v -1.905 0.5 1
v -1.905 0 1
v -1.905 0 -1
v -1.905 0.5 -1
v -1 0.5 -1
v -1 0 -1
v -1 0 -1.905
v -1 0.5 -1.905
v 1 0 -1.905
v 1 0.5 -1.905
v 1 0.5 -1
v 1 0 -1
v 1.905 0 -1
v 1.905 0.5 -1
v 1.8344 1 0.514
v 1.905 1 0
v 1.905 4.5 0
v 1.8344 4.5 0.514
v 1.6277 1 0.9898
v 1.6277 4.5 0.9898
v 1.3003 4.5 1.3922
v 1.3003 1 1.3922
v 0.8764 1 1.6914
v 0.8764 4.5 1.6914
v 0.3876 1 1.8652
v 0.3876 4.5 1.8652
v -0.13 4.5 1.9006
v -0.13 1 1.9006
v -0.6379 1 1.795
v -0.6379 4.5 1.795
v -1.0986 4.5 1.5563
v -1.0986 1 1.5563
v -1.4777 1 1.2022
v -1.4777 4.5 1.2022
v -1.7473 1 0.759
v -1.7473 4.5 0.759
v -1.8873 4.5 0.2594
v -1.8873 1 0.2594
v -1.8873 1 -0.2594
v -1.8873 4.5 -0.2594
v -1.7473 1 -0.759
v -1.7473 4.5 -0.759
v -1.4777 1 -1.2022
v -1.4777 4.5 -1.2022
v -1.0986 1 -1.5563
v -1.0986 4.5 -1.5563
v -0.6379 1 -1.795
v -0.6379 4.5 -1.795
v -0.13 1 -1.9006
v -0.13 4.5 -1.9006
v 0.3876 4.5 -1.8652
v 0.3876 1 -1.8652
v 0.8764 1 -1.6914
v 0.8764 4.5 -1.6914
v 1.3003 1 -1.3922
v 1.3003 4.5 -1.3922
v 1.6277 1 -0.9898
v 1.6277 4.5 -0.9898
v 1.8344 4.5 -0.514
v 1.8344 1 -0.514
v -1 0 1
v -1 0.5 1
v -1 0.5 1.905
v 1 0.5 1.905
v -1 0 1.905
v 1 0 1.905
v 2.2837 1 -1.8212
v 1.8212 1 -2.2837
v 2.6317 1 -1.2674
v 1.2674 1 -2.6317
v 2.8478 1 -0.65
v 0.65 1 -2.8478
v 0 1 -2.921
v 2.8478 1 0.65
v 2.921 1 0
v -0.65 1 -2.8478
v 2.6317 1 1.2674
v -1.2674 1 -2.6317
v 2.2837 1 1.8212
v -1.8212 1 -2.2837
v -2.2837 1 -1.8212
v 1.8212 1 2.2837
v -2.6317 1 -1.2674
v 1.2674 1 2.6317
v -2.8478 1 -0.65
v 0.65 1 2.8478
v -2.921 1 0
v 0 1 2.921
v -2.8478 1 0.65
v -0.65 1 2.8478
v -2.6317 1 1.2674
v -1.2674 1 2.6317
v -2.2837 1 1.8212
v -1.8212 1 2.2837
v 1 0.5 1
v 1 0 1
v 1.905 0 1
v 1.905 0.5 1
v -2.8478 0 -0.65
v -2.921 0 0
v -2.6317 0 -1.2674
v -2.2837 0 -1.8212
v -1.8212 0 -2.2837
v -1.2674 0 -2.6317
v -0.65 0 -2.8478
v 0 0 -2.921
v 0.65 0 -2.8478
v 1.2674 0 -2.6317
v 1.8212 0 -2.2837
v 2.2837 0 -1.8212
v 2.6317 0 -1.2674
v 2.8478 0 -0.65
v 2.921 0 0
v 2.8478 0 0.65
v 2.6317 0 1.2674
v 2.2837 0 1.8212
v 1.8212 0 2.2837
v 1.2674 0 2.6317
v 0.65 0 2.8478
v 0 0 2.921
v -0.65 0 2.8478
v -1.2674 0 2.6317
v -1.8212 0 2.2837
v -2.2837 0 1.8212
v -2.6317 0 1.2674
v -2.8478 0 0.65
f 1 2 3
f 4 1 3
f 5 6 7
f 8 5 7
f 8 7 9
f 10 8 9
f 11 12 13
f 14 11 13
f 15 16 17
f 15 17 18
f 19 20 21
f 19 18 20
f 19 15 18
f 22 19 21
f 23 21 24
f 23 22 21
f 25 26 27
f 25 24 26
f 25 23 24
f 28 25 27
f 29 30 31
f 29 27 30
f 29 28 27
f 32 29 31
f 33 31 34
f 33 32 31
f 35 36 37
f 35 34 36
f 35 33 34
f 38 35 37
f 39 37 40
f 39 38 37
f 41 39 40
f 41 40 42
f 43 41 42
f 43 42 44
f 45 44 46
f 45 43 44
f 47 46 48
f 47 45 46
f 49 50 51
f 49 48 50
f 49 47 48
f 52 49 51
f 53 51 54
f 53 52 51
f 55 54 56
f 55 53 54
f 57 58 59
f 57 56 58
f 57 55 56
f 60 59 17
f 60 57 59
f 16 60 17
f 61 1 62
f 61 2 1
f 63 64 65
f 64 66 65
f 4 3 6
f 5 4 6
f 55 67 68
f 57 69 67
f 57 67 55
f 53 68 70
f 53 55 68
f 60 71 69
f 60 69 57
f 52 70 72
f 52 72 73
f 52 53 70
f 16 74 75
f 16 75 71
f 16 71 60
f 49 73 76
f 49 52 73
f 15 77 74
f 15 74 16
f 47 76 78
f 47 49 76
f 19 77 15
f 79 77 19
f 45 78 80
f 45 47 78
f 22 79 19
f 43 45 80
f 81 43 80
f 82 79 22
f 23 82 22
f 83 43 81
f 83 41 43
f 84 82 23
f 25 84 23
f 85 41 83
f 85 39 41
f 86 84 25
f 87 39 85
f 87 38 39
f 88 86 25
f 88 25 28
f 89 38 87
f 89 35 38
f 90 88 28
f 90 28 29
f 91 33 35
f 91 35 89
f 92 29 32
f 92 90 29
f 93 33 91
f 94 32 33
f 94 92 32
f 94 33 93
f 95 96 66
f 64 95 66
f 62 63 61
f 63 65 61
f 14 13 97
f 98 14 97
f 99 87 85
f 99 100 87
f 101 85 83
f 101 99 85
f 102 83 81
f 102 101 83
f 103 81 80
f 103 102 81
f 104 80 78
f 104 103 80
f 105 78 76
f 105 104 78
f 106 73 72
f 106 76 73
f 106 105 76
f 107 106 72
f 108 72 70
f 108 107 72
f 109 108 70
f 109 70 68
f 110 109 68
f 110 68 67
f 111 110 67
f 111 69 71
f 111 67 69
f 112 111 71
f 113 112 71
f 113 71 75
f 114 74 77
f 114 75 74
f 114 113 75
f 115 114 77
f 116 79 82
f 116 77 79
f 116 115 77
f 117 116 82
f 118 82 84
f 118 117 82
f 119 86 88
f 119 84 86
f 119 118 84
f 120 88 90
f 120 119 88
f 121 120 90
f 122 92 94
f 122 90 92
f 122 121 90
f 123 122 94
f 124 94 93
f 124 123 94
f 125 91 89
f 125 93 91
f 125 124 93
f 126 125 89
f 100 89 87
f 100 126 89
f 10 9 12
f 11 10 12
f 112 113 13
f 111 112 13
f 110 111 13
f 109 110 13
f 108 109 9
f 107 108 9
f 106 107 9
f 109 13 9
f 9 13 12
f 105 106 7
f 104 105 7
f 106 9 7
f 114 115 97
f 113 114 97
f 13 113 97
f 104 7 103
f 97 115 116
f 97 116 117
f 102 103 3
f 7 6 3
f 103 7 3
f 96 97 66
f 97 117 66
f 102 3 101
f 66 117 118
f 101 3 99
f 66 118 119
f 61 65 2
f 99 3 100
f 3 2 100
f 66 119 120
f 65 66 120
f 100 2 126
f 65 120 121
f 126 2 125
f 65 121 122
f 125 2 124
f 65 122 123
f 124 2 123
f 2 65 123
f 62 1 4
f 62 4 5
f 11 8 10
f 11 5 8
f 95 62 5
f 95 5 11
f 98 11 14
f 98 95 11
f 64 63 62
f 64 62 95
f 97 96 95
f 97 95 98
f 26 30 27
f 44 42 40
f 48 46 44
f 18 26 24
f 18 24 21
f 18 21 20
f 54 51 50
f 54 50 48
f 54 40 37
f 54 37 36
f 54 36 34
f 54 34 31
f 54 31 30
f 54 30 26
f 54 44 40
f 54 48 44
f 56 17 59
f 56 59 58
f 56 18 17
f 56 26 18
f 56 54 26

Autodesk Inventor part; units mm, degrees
ref_plane "YZ Plane" through (0, 0, 0) normal (1, 0, 0) x (0, 1, 0)
ref_plane "XZ Plane" through (0, 0, 0) normal (0, 1, 0) x (-1, 0, 0)
ref_plane "XY Plane" through (0, 0, 0) normal (0, 0, 1) x (1, 0, 0)
sketch "Sketch1" plane through (0, 0, 0) normal (0, 1, 0) x (-1, 0, 0)
  circle A0 centre (0, 0) radius 2.921
  dimension "d0" = 5.842
extrude "Extrusion1" add sketch "Sketch1" along normal blind 1
sketch "Sketch2" plane through (0, 1, 0) normal (0, 1, 0) x (1, 0, 0)
  circle A0 centre (0, 0) radius 1.905
  dimension "d3" = 3.81
extrude "Extrusion2" add sketch "Sketch2" along normal blind 3.5
sketch "Sketch3" plane through (0, 0, 0) normal (0, -1, 0) x (1, 0, 0)
  line L0 (0, 1.905) -> (-1, 1.905)
  line L1 (-1, -1.905) -> (1, -1.905)
  line L2 (1, 1.905) -> (0, 1.905)
  line L3 (-1.905, 0) -> (-1.905, -1)
  line L4 (1.905, -1) -> (1.905, 1)
  line L5 (-1.905, 0) -> (-1.905, 1)
  line L6 (-1.905, 1) -> (-1, 1)
  line L7 (1, 1) -> (1.905, 1)
  line L8 (1, -1.905) -> (1, -1)
  line L9 (1, 1) -> (1, 1.905)
  line L10 (-1.905, -1) -> (-1, -1)
  line L11 (1, -1) -> (1.905, -1)
  line L12 (-1, 1.905) -> (-1, 1)
  line L13 (-1, -1) -> (-1, -1.905)
  point P0 (0, 0)
  dimension "d7" = 1
  dimension "d8" = 3.81
  dimension "d9" = 2
  dimension "d10" = 3.81
  dimension "d11" = 1
  dimension "d12" = 3.81
  dimension "d13" = 2
  dimension "d15" = 1
extrude "Extrusion3" cut sketch "Sketch3" against normal blind 0.5
properties part number "armscrew" material "Iron, Gray"
